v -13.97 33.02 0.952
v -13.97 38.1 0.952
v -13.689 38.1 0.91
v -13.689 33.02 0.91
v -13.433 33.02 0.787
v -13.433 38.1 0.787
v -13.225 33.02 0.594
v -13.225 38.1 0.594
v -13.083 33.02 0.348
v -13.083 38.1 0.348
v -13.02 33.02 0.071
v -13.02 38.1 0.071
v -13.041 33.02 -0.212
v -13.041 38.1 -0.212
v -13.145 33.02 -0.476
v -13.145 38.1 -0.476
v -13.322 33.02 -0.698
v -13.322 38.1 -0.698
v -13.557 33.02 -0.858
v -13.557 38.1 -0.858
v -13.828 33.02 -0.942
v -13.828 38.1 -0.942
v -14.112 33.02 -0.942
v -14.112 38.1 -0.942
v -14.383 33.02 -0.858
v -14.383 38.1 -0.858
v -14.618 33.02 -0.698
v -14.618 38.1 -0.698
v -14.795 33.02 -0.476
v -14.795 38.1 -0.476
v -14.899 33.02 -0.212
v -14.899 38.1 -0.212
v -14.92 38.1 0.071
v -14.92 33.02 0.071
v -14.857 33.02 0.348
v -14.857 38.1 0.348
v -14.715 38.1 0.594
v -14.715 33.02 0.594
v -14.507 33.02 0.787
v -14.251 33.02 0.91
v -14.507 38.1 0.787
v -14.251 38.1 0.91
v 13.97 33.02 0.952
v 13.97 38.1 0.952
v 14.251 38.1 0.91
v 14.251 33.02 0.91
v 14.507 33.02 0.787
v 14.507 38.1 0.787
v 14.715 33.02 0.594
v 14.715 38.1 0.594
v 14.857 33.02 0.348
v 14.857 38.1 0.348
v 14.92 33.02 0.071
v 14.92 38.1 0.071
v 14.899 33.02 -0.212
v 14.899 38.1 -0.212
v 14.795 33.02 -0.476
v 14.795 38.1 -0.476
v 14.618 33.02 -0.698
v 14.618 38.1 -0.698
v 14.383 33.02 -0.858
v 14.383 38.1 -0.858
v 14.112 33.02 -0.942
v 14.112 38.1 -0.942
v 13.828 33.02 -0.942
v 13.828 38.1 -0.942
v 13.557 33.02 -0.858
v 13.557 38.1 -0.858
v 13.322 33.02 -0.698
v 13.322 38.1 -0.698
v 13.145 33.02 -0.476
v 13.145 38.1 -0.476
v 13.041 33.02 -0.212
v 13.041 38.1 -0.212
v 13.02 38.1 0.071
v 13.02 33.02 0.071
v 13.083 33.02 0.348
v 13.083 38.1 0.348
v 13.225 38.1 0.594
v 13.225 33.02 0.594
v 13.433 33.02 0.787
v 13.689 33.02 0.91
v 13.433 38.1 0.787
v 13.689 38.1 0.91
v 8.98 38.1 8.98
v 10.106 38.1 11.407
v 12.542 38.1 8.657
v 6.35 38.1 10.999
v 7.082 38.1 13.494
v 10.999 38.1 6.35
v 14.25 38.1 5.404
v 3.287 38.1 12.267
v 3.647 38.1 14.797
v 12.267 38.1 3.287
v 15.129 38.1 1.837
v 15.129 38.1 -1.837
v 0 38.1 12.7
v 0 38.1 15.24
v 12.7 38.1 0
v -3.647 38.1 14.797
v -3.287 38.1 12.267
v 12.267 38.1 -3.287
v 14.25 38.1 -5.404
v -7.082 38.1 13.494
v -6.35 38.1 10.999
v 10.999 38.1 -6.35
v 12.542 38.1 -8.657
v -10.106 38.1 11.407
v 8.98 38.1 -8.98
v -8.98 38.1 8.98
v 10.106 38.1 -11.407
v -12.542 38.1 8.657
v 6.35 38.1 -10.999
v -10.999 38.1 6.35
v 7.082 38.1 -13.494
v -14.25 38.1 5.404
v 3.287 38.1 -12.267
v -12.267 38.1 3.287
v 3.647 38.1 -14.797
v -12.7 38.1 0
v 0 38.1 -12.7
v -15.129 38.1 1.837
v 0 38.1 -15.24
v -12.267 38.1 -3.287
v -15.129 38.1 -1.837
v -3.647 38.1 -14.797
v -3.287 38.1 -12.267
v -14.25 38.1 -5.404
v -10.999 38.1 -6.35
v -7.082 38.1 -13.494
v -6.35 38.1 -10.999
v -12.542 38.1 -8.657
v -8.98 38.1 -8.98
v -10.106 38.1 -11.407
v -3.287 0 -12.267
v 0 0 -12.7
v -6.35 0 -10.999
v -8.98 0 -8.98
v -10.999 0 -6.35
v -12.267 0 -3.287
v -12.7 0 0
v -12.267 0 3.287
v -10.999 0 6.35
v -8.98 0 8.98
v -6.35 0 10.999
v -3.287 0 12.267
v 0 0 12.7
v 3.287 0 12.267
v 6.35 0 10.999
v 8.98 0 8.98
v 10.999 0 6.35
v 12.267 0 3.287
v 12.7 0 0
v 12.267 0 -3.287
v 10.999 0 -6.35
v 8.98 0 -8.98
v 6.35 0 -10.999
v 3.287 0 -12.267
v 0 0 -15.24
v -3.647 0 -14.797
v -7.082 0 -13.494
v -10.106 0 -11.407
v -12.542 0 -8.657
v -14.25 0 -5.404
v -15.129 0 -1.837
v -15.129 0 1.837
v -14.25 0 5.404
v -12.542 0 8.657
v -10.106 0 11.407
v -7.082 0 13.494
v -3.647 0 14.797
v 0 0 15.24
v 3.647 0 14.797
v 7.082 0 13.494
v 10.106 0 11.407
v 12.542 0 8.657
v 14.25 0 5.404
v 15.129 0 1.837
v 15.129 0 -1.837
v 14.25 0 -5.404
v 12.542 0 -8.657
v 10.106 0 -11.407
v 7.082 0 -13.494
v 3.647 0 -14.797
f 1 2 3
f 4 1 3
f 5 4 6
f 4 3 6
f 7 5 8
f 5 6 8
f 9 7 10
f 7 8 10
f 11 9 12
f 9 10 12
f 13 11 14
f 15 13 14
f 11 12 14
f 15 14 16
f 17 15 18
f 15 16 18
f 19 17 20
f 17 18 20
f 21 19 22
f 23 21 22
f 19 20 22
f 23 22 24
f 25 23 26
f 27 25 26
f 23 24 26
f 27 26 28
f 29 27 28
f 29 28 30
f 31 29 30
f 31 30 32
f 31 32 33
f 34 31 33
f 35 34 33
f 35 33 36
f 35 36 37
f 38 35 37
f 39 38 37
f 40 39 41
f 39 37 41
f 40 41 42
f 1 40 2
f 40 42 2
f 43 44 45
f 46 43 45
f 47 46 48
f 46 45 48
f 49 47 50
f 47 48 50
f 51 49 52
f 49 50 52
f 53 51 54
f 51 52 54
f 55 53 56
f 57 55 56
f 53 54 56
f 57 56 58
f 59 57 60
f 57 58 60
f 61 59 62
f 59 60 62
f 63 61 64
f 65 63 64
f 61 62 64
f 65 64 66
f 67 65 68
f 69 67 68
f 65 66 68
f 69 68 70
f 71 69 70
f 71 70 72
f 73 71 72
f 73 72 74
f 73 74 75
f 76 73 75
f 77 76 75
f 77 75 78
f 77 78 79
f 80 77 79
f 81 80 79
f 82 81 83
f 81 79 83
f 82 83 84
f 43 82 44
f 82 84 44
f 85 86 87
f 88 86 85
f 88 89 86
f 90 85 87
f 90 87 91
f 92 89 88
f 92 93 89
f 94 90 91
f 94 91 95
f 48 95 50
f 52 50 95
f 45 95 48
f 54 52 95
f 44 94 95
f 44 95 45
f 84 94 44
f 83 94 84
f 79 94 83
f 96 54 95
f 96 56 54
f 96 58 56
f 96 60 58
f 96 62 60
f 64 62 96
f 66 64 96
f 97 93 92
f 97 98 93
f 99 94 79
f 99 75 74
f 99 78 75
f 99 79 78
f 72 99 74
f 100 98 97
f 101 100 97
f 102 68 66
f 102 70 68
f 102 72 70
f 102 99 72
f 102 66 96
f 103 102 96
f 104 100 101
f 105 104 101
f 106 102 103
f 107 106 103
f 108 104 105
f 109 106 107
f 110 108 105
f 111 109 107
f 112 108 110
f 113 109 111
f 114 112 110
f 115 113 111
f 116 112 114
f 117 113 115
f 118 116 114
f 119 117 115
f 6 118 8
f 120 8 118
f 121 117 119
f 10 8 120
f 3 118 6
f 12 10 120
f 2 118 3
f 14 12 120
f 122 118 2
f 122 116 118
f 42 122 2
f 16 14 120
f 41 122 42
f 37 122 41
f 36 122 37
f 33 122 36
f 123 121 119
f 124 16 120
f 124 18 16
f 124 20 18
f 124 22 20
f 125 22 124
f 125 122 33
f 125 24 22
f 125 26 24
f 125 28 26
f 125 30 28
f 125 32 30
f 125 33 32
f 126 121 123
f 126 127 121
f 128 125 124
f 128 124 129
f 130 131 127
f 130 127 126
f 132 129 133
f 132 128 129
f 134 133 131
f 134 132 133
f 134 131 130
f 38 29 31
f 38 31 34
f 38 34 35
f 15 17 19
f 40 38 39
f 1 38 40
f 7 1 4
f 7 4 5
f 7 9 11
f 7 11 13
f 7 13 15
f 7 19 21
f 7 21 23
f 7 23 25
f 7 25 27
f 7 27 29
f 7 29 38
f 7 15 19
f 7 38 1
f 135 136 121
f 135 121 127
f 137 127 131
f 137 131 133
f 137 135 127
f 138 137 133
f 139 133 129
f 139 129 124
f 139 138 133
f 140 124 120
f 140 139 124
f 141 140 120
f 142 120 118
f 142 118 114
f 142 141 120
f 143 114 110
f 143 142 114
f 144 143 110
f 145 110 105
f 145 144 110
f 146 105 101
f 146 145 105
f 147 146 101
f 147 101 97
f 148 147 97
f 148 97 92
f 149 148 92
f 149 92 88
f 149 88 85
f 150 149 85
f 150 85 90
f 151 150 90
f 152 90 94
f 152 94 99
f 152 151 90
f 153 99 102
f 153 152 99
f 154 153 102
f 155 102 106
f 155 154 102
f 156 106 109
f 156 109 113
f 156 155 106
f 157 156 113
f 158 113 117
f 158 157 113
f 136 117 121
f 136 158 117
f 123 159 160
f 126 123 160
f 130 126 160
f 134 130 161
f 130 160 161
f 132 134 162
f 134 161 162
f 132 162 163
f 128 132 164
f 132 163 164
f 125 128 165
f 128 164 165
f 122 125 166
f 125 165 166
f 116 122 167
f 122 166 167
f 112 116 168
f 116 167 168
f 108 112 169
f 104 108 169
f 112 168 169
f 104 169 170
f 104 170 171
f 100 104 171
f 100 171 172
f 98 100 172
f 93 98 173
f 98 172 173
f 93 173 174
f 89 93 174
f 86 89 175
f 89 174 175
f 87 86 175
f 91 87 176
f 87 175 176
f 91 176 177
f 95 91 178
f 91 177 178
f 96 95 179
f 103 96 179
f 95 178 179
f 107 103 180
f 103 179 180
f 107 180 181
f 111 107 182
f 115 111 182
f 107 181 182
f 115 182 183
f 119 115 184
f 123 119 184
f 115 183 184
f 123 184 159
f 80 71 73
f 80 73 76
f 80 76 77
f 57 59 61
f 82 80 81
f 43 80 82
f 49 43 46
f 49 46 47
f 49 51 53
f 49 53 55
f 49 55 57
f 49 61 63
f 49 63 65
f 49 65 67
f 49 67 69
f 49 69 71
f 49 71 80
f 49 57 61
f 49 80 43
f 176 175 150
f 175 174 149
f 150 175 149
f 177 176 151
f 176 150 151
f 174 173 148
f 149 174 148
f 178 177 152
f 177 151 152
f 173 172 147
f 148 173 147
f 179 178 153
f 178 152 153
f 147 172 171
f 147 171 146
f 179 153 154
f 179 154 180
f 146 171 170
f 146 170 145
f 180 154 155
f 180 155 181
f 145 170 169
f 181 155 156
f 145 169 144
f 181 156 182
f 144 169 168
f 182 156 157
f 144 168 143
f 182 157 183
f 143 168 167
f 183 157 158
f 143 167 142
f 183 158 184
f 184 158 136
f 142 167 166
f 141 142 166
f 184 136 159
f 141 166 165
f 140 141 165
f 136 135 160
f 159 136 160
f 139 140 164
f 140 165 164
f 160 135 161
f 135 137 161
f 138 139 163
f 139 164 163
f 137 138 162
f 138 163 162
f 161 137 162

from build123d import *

# Parameters (mm, degrees)
SKETCH1_R           = 15.24
SKETCH1_R_2         = 12.7
BOSS_EXTRUDE1_DEPTH = 38.1
SKETCH2_R           = 0.9525
CUT_EXTRUDE1_DEPTH  = 5.08


with BuildPart() as part:
    # Sketch1 → Boss-Extrude1 (new body)
    with BuildSketch(Plane(origin=(0, 0, 0), x_dir=(1, 0, 0), z_dir=(0, 1, 0))):
        with Locations(Location((0, 0, 0), (0, 0, 90))):
            Circle(SKETCH1_R)
        with Locations(Location((0, 0, 0), (0, 0, 90))):
            Circle(SKETCH1_R_2, mode=Mode.SUBTRACT)
    extrude(amount=BOSS_EXTRUDE1_DEPTH)

    # Sketch2 → Cut-Extrude1 (cut)
    with BuildSketch(Plane(origin=(0, 38.1, 0), x_dir=(1, 0, 0), z_dir=(0, 1, 0))):
        with Locations(Location((-13.97, 0, 0), (0, 0, 270))):
            Circle(SKETCH2_R)
        with Locations(Location((13.97, 0, 0), (0, 0, 270))):
            Circle(SKETCH2_R)
    extrude(amount=-CUT_EXTRUDE1_DEPTH, mode=Mode.SUBTRACT)


solid = part.part
